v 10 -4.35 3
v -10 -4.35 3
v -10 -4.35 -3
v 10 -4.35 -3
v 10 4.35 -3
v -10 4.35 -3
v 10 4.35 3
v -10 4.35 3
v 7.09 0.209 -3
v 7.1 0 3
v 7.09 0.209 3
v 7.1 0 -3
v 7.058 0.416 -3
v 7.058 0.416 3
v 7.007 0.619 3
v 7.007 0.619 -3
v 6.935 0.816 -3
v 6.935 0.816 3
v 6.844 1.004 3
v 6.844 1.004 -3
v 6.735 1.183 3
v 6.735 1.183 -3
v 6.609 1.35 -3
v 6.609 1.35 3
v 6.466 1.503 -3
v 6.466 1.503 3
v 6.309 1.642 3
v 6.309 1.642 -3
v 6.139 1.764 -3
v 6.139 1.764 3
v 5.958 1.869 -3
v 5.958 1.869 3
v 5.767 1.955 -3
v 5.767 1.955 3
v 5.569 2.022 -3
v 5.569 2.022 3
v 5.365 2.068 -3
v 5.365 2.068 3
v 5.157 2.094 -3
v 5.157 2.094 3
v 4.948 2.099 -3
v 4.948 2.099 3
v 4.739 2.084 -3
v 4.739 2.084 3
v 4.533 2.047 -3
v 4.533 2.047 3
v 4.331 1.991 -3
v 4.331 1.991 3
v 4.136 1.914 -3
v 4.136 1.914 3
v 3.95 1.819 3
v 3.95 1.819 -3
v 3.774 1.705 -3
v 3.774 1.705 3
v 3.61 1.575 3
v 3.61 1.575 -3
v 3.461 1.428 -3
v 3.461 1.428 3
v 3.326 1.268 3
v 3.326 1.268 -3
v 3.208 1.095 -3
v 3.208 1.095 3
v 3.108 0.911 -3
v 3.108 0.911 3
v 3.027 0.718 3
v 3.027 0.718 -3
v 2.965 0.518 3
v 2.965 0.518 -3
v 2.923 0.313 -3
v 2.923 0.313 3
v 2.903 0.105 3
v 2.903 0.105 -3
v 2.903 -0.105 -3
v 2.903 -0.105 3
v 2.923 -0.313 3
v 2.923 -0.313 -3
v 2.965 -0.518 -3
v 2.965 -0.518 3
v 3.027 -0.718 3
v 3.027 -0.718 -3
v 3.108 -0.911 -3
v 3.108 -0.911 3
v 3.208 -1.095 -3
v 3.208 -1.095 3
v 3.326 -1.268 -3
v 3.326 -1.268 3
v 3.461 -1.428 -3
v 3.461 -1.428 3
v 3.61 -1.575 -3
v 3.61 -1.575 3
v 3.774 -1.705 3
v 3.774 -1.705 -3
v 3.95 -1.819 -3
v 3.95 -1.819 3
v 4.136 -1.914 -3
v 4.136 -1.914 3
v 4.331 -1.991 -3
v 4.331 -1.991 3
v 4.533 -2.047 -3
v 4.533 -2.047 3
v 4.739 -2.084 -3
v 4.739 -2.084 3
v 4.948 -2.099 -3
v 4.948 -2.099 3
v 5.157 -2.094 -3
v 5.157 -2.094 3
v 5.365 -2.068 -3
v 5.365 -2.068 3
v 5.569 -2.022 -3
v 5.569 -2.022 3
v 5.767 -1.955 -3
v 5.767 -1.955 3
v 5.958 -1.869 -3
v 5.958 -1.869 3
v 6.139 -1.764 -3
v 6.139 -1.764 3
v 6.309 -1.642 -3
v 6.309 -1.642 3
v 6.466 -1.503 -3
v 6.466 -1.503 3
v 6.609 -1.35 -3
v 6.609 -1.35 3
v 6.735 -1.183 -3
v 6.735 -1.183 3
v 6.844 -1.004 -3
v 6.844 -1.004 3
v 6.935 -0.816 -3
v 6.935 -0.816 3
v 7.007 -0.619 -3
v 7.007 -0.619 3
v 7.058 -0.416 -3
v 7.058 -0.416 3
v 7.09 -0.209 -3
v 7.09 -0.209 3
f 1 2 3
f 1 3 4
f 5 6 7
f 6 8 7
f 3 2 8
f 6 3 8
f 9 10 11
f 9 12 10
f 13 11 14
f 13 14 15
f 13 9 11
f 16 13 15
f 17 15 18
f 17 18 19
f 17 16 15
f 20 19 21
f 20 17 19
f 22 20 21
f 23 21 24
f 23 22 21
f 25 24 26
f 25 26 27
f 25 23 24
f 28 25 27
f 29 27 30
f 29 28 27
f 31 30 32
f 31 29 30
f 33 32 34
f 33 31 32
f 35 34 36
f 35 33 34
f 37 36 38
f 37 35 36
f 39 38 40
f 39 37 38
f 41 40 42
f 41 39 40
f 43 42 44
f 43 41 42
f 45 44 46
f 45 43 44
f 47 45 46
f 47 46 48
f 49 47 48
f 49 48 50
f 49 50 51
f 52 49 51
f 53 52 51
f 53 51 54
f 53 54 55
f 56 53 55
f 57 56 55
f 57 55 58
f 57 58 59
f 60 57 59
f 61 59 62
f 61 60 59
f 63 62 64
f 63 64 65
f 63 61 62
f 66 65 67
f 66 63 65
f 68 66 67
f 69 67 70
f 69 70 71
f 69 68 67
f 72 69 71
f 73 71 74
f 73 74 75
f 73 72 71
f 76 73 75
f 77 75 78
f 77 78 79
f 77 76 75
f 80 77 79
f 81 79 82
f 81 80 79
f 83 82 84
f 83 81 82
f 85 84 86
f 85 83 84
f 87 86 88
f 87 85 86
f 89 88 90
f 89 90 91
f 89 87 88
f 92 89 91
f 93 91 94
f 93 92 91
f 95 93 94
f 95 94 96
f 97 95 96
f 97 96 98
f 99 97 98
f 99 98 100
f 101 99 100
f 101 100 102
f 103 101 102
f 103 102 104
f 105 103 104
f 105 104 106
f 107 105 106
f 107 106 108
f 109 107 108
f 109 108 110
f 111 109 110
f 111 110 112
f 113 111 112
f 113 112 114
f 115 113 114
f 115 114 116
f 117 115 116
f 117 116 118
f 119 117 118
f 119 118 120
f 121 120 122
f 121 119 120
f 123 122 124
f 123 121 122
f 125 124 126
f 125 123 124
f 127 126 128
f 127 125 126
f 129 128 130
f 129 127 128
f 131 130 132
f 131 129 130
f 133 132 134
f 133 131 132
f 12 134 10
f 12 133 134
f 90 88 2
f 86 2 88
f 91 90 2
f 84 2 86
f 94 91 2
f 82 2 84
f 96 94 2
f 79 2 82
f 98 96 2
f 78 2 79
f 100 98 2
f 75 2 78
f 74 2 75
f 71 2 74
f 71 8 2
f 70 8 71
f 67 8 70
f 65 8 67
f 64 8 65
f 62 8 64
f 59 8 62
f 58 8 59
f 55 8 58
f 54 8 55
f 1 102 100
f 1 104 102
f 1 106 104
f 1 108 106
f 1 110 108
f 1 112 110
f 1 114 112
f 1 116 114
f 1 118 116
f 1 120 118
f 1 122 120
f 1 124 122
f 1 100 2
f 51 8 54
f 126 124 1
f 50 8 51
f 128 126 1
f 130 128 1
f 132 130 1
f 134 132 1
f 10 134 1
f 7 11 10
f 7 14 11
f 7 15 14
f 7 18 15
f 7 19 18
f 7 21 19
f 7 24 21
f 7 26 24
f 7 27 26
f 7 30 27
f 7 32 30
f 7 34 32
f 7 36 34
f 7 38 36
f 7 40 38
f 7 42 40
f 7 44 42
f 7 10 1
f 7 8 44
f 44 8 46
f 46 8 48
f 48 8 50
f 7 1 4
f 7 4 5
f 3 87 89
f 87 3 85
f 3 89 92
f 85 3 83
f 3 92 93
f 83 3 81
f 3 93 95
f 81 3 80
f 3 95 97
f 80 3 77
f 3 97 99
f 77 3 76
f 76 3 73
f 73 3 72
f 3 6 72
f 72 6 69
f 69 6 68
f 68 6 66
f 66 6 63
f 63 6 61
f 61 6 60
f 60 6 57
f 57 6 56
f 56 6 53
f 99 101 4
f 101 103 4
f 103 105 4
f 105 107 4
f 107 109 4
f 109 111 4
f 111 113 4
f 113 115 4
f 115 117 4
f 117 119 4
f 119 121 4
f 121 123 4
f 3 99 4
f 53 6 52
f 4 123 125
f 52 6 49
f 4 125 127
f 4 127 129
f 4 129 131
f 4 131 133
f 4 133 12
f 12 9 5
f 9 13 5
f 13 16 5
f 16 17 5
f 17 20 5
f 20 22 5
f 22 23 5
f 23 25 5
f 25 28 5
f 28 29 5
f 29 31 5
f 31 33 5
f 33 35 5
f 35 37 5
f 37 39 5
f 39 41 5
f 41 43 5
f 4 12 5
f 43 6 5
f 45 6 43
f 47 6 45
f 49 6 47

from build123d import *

# Parameters (mm, degrees)
SKETCH_1_W      = 20
SKETCH_1_H      = 8.7
SKETCH_1_R      = 2.1
EXTRUDE_1_DEPTH = 3


with BuildPart() as part:
    # 草图1 → 凸台-拉伸1 (new, symmetric)
    with BuildSketch(Plane.XY):
        Rectangle(SKETCH_1_W, SKETCH_1_H)
        with Locations((5, 0)):
            Circle(SKETCH_1_R, mode=Mode.SUBTRACT)
    extrude(amount=EXTRUDE_1_DEPTH, both=True)


solid = part.part
